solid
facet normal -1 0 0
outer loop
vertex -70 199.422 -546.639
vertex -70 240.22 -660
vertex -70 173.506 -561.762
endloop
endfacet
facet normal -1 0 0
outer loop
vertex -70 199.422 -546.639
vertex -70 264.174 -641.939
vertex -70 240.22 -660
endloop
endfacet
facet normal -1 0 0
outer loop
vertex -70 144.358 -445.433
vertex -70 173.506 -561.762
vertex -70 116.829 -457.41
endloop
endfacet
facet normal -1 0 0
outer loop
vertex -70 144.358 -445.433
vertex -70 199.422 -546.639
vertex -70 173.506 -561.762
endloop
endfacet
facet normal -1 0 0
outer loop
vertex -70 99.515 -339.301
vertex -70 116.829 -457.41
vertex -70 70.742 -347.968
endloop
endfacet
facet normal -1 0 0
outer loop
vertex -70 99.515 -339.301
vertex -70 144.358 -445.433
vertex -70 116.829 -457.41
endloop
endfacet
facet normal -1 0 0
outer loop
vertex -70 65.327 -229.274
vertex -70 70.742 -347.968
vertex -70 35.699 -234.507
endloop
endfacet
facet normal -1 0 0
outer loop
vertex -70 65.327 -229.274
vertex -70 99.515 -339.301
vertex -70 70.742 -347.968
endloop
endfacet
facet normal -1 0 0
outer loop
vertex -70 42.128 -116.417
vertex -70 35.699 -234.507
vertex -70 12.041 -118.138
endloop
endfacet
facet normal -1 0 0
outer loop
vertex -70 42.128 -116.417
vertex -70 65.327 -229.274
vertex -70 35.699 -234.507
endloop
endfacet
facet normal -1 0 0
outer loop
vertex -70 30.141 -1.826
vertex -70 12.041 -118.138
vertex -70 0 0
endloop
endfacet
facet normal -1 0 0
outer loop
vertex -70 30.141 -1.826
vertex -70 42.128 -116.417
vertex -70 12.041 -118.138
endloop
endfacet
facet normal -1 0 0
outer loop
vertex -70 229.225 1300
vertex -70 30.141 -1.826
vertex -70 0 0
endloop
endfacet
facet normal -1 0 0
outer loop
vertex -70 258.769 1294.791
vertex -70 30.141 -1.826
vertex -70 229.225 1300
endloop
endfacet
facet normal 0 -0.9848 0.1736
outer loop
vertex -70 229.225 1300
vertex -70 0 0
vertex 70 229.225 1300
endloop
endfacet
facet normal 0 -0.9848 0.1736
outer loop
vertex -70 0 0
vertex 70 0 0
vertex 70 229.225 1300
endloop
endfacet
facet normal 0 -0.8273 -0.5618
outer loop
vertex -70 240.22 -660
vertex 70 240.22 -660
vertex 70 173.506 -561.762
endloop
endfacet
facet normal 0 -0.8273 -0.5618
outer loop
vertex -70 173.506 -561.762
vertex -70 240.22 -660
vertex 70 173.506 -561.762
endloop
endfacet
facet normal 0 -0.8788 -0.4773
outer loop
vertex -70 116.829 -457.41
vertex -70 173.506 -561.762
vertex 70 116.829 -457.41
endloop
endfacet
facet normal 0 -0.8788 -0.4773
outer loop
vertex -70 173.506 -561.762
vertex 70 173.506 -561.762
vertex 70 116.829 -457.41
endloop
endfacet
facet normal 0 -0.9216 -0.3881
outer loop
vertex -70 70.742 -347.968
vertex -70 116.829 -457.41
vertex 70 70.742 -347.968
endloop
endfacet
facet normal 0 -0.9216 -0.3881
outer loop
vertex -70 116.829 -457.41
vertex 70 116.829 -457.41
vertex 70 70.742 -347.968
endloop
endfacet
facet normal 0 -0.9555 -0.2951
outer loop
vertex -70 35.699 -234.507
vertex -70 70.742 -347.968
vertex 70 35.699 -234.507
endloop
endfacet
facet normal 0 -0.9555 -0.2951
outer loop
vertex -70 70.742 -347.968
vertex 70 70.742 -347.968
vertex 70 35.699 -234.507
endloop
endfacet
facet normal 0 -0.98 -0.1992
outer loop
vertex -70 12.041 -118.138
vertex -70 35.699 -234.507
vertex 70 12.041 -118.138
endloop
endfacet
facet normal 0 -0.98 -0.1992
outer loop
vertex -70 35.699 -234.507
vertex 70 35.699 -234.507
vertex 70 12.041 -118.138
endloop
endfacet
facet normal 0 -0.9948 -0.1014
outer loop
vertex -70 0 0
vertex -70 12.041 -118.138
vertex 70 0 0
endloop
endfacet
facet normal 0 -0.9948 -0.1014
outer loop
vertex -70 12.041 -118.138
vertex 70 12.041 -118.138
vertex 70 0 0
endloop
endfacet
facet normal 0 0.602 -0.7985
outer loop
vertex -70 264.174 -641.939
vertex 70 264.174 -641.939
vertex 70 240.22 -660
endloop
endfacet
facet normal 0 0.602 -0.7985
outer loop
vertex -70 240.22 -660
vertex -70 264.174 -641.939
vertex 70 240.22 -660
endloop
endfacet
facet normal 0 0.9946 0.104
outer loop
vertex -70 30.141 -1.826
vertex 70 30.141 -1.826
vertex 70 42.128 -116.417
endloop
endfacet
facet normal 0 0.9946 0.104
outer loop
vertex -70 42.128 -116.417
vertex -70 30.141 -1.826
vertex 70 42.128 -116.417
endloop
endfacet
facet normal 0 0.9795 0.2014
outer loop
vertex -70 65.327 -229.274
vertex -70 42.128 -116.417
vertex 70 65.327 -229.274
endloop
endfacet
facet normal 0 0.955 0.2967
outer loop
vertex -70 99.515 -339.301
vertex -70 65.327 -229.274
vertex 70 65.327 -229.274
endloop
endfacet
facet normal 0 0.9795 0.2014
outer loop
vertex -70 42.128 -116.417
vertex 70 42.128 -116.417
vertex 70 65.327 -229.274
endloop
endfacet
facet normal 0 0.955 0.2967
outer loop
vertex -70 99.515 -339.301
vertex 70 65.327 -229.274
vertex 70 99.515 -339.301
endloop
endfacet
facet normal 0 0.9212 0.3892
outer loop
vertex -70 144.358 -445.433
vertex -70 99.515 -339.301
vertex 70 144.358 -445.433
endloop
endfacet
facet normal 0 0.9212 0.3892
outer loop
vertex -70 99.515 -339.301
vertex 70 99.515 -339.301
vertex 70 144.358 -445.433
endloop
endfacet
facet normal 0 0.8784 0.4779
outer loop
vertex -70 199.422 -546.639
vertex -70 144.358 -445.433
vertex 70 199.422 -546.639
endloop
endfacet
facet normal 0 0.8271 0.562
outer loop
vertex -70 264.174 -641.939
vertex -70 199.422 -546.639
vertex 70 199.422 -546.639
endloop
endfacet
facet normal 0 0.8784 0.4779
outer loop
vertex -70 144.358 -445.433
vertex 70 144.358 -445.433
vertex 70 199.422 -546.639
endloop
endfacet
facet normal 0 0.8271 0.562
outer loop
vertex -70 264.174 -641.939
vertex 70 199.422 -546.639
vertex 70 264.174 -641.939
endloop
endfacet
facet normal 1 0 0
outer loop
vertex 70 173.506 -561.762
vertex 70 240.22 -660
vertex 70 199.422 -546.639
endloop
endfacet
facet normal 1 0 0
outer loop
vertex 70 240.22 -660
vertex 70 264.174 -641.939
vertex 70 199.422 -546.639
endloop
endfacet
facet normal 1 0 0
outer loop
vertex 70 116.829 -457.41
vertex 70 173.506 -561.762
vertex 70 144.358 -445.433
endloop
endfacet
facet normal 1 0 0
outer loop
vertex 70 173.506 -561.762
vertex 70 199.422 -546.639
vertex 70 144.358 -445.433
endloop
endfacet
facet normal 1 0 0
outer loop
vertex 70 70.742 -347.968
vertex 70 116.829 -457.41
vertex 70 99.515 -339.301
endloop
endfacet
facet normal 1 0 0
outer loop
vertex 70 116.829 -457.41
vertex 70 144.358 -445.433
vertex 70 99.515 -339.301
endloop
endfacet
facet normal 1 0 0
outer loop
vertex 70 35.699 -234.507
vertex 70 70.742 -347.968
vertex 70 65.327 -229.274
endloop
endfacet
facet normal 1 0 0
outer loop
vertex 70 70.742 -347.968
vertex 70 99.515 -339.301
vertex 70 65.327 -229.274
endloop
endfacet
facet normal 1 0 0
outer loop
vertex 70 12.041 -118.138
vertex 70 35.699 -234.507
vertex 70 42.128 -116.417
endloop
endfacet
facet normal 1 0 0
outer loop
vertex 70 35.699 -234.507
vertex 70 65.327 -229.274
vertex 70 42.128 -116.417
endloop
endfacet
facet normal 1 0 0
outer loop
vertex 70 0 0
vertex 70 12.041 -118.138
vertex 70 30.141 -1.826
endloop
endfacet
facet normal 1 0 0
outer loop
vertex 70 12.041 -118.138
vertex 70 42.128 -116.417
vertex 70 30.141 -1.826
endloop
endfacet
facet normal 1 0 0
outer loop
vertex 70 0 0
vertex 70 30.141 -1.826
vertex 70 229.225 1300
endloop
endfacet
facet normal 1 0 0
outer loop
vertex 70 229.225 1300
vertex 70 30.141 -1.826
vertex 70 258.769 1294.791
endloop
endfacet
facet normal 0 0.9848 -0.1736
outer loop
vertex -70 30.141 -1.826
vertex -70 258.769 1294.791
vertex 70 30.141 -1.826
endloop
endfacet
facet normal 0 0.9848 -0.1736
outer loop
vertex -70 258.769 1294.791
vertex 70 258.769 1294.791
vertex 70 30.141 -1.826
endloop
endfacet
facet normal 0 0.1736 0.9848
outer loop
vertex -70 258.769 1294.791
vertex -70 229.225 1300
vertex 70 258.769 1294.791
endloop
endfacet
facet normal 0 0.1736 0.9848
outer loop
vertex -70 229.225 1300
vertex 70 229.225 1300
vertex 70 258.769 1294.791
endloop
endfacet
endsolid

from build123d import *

# Parameters (mm, degrees)
EXTRUDE_THIN1_DEPTH = 70


with BuildPart() as part:
    # Sketch1 → Extrude-Thin1 (new, symmetric)
    with BuildSketch(Plane(origin=(0, 0, 0), x_dir=(0, 0, -1), z_dir=(1, 0, 0))):
        with BuildLine():
            ThreePointArc((660, 240.220354616), (347.968383065, 70.742450573), (0, 0))
            Line((0, 0), (-1300, 229.225074921))
            Line((-1300, 229.225074921), (-1294.79055467, 258.769307511))
            Line((-1294.79055467, 258.769307511), (1.826085437, 30.140810225))
            ThreePointArc((1.826085437, 30.140810225), (339.301235488, 99.514508401), (641.938605277, 264.174185638))
            Line((641.938605277, 264.174185638), (660, 240.220354616))
        make_face()
    extrude(amount=EXTRUDE_THIN1_DEPTH, both=True)


solid = part.part
